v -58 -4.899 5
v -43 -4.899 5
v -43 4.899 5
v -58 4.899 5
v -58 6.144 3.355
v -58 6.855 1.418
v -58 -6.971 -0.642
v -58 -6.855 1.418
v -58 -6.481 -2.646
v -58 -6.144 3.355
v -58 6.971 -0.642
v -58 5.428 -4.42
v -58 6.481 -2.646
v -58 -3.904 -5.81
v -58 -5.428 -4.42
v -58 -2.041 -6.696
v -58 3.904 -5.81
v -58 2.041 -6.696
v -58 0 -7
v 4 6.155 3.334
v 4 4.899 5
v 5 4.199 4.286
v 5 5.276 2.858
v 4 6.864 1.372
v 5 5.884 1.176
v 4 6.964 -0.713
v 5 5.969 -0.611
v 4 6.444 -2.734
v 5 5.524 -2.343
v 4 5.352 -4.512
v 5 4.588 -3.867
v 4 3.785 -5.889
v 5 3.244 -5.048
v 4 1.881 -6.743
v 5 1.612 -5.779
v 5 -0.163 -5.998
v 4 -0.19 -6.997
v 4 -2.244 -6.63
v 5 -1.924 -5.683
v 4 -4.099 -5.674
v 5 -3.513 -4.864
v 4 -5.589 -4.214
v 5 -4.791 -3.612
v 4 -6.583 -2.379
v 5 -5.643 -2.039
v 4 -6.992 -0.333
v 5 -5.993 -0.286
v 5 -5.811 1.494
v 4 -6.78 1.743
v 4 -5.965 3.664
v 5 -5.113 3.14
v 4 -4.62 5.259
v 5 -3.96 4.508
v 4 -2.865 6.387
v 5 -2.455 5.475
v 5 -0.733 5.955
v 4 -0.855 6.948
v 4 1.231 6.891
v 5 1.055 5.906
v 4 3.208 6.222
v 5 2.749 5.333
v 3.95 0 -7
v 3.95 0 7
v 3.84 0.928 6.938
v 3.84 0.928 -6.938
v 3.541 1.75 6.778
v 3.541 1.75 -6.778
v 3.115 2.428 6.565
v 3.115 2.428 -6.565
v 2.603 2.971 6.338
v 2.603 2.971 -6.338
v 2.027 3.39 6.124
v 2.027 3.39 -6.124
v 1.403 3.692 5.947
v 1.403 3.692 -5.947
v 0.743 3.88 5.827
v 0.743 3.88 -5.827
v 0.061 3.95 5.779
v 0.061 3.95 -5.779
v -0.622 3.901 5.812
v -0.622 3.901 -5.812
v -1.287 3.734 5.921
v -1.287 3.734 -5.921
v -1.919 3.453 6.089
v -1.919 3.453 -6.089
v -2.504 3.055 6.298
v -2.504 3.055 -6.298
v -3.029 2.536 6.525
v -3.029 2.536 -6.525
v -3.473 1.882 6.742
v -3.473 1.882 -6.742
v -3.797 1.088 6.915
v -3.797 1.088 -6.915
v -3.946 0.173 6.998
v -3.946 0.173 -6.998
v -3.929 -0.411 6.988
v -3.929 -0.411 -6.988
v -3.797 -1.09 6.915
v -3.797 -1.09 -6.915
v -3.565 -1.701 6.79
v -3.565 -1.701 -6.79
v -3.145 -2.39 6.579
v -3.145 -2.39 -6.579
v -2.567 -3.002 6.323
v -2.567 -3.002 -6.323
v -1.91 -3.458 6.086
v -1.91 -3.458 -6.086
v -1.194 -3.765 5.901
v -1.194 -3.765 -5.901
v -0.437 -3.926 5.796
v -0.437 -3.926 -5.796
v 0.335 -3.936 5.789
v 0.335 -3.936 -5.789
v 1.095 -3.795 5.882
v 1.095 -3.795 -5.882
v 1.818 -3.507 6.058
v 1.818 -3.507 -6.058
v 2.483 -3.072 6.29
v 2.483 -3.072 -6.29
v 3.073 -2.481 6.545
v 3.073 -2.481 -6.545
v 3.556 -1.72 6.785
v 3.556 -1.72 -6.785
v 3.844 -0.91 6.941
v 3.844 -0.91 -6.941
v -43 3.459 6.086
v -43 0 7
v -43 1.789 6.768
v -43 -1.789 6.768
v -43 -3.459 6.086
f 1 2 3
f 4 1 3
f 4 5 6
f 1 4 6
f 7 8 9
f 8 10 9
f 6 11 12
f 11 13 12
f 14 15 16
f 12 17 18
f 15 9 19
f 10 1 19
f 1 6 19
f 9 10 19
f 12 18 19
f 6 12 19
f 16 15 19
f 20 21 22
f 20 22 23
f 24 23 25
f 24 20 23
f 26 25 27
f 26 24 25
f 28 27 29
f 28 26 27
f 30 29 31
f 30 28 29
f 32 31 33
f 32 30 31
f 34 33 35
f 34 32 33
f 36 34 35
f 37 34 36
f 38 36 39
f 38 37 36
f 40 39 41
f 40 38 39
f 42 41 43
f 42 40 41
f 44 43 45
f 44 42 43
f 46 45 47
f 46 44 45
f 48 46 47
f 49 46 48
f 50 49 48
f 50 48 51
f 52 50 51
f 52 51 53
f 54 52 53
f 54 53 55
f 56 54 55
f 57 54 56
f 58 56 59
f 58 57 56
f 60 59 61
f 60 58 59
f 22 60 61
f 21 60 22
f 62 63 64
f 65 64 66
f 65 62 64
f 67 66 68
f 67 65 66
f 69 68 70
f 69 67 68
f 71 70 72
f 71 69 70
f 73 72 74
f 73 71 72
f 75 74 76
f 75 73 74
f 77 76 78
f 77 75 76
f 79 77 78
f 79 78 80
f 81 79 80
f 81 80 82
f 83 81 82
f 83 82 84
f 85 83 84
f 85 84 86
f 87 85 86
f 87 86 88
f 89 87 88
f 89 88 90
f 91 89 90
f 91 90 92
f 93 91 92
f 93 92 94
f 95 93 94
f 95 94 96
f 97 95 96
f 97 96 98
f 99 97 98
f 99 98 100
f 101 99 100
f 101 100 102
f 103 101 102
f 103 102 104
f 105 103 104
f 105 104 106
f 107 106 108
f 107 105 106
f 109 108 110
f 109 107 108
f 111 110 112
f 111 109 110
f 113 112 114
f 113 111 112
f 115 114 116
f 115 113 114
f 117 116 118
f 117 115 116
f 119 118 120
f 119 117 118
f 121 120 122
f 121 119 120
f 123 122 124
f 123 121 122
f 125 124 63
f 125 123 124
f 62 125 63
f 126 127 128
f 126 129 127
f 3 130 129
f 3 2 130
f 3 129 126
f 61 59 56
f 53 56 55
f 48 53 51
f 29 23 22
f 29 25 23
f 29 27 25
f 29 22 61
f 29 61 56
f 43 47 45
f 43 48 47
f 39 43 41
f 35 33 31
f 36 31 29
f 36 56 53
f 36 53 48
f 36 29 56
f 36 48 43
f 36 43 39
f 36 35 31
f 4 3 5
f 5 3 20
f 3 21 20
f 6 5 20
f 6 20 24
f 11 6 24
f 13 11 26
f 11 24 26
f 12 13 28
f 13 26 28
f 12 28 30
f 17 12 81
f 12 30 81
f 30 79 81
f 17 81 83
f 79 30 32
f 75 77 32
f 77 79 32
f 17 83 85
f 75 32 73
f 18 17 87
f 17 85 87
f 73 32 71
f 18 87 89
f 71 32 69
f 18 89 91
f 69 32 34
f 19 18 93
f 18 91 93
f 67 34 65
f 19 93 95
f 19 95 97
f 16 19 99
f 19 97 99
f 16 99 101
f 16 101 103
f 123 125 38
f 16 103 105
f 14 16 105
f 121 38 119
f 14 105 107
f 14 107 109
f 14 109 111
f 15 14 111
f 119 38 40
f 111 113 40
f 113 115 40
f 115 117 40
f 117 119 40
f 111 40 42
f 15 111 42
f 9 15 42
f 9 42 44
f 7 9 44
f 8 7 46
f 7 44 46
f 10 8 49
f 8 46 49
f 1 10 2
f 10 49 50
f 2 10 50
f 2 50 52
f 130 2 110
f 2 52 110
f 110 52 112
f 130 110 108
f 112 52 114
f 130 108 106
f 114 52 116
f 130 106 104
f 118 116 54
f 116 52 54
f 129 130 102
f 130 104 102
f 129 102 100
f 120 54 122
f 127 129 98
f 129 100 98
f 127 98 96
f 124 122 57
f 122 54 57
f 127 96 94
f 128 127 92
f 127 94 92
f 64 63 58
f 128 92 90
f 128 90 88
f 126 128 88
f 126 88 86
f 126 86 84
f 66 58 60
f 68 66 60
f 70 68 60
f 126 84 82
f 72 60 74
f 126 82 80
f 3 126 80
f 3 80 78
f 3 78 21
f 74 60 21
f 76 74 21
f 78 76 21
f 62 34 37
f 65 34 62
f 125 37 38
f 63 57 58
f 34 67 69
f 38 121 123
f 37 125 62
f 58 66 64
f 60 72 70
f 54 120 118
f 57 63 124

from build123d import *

# Parameters (mm, degrees)
ESQUISSE1_W                  = 63
ESQUISSE1_H                  = 7
CHANFREIN1_SIZE              = 1
ENL_V_MAT_EXTRU_2_DEPTH      = 10
ENL_V_MAT_EXTRU_2_DEPTH_BACK = 10
ESQUISSE2_R                  = 3.95
ESQUISSE3_W                  = 3
ESQUISSE3_H                  = 13
ENL_V_MAT_EXTRU_3_DEPTH      = 15


with BuildPart() as part:
    # Esquisse1 → Base-Révolution (revolve)
    with BuildSketch(Plane.XY, mode=Mode.PRIVATE) as base_r_volution_sk:
        with Locations((-26.5, 3.5)):
            Rectangle(ESQUISSE1_W, ESQUISSE1_H)
    revolve(base_r_volution_sk.sketch.rotate(Axis((9, 0, 0), (-1, 0, 0)), 314.415308597), axis=Axis((9, 0, 0), (-1, 0, 0)))

    # Chanfrein1
    chanfrein1_edges = [part.edges().sort_by_distance(p)[0] for p in [
        (5, -4.898979486, -5),
    ]]
    chamfer(chanfrein1_edges, length=CHANFREIN1_SIZE)

    # Esquisse2 → Enlèv. mat.-Extru.2 (cut, two sides: drawn at the far end of the back side and taken through both)
    with BuildSketch(Plane.XY.offset(-ENL_V_MAT_EXTRU_2_DEPTH_BACK)):
        Circle(ESQUISSE2_R)
    extrude(amount=ENL_V_MAT_EXTRU_2_DEPTH + ENL_V_MAT_EXTRU_2_DEPTH_BACK, mode=Mode.SUBTRACT)

    # Esquisse3 → Enlèv. mat.-Extru.3 (cut)
    with BuildSketch(Plane.ZY.offset(58)):
        with Locations((6.5, 0.5)):
            Rectangle(ESQUISSE3_W, ESQUISSE3_H)
    extrude(amount=-ENL_V_MAT_EXTRU_3_DEPTH, mode=Mode.SUBTRACT)


solid = part.part
